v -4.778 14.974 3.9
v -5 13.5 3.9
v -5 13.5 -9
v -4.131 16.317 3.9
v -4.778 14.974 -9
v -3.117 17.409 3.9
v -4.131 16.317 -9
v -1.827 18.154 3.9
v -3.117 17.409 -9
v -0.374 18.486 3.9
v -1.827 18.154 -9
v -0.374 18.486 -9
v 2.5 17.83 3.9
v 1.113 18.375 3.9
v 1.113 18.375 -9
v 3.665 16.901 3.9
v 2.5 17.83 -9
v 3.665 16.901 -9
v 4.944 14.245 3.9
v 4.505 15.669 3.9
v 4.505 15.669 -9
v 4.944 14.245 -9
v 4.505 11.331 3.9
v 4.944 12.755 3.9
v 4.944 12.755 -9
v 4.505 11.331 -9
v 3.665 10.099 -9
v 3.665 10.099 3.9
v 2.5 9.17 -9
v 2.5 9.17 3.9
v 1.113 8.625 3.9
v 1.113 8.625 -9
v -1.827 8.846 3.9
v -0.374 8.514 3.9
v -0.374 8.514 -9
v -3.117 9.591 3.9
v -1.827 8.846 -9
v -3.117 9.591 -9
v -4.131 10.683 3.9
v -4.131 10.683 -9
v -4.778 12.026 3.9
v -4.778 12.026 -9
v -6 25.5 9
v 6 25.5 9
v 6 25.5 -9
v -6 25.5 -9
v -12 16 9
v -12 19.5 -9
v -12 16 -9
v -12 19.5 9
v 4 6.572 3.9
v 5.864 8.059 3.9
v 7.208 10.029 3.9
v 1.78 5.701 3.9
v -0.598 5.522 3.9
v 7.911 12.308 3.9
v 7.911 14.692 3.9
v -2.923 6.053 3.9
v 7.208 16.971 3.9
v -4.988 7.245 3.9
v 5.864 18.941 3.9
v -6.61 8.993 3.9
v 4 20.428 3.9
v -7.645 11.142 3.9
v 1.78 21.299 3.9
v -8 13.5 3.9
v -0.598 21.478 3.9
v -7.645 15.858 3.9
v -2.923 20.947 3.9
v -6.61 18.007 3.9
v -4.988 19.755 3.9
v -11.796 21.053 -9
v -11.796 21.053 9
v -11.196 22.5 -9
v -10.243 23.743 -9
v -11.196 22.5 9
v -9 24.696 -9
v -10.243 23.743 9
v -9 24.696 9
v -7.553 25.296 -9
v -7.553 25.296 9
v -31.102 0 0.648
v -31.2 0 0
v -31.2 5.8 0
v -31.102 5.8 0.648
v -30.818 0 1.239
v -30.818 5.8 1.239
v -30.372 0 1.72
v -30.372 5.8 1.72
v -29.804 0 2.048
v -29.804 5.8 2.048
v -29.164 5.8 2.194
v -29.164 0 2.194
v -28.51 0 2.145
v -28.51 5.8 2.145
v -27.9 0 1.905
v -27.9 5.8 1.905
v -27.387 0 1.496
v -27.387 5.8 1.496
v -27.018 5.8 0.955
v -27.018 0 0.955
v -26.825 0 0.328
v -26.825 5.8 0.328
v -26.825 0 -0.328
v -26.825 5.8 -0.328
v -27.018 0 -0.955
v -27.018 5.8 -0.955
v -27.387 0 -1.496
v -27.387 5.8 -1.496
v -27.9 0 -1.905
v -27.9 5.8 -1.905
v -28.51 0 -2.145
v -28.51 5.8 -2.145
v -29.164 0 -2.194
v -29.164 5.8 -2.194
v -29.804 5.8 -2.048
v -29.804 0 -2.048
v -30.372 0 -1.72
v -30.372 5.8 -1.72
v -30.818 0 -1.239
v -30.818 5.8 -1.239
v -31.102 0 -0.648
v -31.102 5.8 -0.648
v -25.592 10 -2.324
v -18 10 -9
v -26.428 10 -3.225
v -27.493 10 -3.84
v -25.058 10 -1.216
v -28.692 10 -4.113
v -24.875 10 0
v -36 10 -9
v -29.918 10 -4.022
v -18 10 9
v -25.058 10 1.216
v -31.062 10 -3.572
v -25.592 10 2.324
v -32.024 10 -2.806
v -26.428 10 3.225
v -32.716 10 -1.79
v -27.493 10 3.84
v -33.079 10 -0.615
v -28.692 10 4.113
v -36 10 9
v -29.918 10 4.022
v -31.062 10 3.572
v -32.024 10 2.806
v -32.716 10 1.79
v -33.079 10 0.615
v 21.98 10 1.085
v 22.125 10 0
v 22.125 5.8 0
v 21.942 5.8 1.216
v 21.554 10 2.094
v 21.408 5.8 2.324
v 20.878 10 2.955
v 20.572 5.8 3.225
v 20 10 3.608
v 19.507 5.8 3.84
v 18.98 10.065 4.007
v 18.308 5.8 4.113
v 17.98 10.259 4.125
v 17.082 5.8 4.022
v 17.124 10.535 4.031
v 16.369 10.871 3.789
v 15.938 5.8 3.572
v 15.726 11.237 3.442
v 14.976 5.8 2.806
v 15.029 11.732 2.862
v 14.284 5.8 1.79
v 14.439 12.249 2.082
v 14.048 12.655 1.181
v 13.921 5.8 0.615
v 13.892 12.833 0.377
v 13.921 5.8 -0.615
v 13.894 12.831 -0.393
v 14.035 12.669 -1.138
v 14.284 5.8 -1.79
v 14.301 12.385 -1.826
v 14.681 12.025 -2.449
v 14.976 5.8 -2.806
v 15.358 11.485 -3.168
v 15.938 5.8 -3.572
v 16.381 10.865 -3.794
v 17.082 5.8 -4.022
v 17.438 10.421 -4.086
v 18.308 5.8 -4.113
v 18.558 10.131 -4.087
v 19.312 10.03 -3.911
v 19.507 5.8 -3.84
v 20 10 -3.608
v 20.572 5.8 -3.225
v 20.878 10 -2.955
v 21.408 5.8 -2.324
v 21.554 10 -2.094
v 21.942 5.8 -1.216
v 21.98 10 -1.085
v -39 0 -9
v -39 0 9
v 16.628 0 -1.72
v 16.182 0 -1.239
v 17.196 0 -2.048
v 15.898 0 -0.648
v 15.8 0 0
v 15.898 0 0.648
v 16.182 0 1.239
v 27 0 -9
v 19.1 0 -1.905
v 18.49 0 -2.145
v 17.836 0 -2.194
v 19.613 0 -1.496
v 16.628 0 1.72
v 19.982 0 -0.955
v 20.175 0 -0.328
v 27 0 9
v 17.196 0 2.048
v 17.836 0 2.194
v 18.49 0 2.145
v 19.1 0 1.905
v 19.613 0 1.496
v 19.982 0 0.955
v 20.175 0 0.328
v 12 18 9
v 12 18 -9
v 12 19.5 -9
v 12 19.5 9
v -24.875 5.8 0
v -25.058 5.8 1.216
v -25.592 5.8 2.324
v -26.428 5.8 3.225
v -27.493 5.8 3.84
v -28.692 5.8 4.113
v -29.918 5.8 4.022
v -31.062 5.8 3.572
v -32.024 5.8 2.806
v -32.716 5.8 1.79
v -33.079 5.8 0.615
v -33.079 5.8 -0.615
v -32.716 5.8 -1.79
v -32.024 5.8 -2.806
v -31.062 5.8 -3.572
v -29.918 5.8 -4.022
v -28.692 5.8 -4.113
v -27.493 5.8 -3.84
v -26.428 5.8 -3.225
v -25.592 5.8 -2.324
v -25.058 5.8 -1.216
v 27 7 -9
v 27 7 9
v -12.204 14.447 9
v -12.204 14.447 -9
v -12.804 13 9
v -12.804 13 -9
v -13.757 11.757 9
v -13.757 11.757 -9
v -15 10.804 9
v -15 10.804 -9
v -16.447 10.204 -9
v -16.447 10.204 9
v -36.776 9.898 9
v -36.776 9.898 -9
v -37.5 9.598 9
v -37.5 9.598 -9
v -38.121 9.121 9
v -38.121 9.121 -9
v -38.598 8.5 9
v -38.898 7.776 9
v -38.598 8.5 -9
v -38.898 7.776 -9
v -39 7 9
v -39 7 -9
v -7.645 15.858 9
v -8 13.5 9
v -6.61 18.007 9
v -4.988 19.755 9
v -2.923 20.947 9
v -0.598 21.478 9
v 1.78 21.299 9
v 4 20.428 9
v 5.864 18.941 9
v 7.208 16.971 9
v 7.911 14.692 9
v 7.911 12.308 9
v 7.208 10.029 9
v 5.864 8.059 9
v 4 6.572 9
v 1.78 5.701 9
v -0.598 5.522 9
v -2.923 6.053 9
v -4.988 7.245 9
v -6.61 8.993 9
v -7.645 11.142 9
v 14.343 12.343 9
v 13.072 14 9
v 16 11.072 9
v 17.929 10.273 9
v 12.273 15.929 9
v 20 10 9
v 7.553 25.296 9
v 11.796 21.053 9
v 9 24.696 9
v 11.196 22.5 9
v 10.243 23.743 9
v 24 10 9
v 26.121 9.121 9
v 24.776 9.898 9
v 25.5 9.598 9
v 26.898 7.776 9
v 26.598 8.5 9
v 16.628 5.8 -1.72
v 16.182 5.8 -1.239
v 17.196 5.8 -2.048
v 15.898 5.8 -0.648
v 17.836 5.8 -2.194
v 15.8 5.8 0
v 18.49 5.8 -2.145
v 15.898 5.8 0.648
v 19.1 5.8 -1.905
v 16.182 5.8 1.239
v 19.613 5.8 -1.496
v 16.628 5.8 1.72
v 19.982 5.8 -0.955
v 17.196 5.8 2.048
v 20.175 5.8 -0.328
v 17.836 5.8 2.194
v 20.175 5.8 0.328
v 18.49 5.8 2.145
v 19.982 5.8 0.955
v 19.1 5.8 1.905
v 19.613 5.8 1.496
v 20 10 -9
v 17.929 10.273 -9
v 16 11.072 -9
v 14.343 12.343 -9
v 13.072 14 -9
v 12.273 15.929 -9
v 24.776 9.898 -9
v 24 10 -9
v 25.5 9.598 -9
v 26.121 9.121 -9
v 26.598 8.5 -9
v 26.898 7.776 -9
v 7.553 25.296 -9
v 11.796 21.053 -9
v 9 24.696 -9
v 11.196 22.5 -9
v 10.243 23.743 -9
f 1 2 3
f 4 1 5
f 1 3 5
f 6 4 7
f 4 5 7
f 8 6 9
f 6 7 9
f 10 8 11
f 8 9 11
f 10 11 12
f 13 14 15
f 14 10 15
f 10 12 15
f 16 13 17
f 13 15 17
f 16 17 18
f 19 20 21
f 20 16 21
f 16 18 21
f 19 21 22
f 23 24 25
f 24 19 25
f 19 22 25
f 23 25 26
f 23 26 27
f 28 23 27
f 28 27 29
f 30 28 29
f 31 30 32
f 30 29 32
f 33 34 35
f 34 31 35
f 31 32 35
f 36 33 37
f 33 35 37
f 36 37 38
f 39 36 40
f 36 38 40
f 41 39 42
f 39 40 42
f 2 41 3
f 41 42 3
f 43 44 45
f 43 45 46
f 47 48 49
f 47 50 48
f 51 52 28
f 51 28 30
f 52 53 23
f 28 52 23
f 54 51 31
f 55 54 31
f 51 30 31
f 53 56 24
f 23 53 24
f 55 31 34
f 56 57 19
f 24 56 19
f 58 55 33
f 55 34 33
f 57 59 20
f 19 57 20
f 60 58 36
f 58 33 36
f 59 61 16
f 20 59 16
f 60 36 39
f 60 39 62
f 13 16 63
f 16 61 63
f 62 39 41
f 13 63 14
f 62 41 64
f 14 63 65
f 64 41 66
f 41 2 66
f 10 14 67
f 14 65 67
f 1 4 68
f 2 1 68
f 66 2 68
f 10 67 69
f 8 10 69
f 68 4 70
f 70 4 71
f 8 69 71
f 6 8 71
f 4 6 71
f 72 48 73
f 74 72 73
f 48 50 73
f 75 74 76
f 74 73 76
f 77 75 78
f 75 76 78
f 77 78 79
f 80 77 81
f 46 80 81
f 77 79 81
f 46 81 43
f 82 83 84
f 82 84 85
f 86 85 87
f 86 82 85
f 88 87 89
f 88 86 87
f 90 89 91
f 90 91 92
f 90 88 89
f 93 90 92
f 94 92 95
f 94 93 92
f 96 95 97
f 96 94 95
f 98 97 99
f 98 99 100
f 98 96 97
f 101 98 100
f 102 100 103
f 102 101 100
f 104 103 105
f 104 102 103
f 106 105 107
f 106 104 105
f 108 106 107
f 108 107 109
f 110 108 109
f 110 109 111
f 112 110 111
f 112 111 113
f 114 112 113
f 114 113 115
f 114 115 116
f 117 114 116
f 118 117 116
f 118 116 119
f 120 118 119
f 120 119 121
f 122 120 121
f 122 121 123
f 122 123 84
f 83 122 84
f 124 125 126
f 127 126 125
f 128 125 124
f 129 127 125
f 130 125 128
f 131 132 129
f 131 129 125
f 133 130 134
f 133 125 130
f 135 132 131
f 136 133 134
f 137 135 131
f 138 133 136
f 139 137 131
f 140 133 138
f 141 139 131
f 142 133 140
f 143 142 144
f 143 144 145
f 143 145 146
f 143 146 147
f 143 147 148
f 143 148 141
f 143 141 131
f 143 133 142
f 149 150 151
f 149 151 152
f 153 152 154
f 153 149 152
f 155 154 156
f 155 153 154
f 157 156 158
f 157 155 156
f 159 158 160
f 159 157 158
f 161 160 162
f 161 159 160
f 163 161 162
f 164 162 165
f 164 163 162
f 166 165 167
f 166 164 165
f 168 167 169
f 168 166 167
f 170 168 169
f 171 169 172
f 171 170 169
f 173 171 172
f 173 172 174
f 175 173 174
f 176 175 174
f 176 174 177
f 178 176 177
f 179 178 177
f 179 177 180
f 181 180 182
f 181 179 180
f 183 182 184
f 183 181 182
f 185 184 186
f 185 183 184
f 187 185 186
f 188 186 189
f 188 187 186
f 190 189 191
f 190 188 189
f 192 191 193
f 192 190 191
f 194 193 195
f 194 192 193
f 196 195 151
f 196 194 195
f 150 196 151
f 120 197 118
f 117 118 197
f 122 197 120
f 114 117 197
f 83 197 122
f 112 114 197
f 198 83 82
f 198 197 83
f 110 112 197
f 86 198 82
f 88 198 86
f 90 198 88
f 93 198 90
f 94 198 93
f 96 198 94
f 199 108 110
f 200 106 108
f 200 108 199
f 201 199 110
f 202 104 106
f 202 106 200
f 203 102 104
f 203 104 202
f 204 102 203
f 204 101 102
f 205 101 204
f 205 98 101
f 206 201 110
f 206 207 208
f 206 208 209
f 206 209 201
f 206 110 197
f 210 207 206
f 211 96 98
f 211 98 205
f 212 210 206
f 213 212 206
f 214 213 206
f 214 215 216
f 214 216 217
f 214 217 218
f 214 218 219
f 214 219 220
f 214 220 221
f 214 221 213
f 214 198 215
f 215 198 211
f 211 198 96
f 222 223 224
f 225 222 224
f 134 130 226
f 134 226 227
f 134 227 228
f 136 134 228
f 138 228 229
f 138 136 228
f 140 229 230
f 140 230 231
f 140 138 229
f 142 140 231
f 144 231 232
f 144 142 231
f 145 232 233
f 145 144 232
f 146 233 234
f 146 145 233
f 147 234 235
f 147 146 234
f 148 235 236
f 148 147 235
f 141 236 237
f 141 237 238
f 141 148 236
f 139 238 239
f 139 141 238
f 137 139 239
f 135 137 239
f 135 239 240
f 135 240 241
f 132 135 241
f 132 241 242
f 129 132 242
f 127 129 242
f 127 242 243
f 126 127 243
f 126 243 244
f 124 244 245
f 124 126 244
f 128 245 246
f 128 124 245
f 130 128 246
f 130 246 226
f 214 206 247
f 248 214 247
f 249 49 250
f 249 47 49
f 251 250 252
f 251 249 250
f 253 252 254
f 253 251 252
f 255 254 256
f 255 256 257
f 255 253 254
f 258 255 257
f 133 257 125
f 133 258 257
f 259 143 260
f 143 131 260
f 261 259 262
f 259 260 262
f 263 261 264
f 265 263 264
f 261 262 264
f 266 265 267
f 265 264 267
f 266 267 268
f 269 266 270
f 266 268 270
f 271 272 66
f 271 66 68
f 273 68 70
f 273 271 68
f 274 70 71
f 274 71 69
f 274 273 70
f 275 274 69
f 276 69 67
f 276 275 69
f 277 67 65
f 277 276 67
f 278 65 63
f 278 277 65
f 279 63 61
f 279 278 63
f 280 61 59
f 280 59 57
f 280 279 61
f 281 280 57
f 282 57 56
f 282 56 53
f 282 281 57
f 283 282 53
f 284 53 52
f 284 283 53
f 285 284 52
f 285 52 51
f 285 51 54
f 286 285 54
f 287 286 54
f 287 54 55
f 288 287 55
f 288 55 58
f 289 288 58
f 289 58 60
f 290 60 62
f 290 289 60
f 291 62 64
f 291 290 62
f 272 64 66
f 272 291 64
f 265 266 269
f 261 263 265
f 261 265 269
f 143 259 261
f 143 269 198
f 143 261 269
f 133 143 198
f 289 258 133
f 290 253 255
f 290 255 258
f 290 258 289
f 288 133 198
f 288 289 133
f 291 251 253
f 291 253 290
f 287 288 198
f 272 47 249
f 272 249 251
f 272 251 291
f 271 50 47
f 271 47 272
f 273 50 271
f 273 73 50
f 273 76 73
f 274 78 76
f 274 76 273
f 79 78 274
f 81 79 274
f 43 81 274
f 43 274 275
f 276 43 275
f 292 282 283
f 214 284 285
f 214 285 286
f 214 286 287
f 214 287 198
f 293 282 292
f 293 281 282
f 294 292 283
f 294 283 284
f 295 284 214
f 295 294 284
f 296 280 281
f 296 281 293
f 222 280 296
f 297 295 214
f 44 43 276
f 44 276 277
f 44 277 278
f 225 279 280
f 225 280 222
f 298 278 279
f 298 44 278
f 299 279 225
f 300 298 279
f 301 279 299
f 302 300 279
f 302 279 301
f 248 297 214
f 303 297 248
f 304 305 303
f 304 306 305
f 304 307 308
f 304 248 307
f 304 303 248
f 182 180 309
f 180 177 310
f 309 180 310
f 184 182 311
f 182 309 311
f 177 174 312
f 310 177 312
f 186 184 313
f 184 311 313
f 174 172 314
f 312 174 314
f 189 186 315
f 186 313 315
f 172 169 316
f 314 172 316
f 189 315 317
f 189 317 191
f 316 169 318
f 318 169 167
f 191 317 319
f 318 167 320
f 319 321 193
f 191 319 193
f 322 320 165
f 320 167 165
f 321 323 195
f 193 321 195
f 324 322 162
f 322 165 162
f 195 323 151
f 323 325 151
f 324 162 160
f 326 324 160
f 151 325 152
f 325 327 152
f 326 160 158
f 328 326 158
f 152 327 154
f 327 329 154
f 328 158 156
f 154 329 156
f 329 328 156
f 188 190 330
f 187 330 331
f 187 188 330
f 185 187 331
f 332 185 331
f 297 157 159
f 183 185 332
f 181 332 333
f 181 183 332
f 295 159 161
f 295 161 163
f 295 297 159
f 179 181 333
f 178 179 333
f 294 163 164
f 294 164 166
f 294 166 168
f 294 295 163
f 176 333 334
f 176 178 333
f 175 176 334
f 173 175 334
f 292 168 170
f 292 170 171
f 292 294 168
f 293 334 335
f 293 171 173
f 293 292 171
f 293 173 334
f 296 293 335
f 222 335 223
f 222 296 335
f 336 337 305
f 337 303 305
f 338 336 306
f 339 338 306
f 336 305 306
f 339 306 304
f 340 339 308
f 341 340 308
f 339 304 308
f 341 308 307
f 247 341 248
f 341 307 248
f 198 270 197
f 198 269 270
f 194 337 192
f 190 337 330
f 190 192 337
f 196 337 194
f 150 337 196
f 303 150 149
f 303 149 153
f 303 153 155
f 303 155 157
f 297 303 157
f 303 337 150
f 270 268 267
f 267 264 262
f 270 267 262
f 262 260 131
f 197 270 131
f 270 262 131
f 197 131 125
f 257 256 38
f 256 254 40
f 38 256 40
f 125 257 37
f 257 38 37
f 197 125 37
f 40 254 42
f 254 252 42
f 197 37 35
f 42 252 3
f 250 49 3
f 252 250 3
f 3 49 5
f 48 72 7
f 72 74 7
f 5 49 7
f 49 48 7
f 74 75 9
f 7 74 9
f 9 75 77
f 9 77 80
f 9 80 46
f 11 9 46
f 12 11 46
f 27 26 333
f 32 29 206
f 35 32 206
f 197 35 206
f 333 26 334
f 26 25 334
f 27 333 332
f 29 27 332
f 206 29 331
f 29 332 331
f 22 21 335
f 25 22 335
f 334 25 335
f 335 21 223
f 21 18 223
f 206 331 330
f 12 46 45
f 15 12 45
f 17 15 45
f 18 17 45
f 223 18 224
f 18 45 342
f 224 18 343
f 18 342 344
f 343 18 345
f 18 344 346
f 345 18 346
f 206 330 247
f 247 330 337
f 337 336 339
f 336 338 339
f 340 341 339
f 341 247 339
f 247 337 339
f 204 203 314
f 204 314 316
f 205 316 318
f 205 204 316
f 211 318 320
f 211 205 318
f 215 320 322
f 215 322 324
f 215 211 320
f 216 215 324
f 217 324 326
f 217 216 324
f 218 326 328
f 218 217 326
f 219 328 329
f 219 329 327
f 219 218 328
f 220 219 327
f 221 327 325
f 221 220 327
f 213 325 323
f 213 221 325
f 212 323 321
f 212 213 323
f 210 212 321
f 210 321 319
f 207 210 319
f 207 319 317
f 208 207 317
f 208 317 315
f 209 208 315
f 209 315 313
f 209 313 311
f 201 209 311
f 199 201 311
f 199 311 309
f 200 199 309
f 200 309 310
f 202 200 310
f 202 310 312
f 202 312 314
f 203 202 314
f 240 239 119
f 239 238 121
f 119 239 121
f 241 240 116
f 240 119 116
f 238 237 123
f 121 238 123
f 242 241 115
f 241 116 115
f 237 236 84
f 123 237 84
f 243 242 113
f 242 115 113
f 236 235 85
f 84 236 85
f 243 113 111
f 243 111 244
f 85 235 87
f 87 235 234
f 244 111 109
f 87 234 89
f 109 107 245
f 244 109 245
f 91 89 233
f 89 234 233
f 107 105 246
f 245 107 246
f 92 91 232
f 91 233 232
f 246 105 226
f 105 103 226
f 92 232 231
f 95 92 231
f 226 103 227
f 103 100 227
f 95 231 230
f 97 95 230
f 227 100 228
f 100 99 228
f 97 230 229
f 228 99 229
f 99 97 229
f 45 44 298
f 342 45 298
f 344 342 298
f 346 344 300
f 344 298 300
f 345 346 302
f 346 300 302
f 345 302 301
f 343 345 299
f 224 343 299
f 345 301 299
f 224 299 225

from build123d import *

# Parameters (mm, degrees)
SKETCH_R        = 5
PAD_DEPTH       = 9
SKETCH005_R     = 2.2
POCKET_DEPTH    = 25.501
SKETCH006_R     = 8
POCKET001_DEPTH = 5.1
SKETCH007_R     = 4.125
POCKET002_DEPTH = 4.2
FILLET_R        = 3


with BuildPart() as filletbody:
    # Sketch → Pad (new body, symmetric)
    with BuildSketch(Plane.XY):
        with BuildLine():
            Line((-6, 25.5), (6, 25.5))
            ThreePointArc((12, 19.5), (10.242641, 23.742641), (6, 25.5))
            Line((12, 19.5), (12, 16))
            ThreePointArc((12, 16), (13.757359, 11.757359), (18, 10))
            Line((18, 10), (39, 10))
            Line((39, 10), (39, 0))
            Line((39, 0), (-27, 0))
            Line((-27, 0), (-27, 10))
            Line((-27, 10), (-20, 10))
            ThreePointArc((-20, 10), (-14.343146, 12.343146), (-12, 18))
            Line((-12, 18), (-12, 19.5))
            ThreePointArc((-6, 25.5), (-10.242641, 23.742641), (-12, 19.5))
        make_face()
        with Locations((0, 13.5)):
            Circle(SKETCH_R, mode=Mode.SUBTRACT)
    extrude(amount=PAD_DEPTH, both=True)

    # Sketch005 (on Face7 of Pad) → Pocket (cut, through all)
    with BuildSketch(Plane.XZ):
        with Locations((29, 0)):
            Circle(SKETCH005_R)
        with Locations((-18, 0)):
            Circle(SKETCH005_R)
    extrude(amount=-POCKET_DEPTH, mode=Mode.SUBTRACT)

    # Sketch006 (on Face5 of Pocket) → Pocket001 (cut)
    with BuildSketch(Plane.XY.offset(9)):
        with Locations((0, 13.5)):
            Circle(SKETCH006_R)
    extrude(amount=-POCKET001_DEPTH, mode=Mode.SUBTRACT)

    # Sketch007 (on Face9 of Pocket001) → Pocket002 (cut, symmetric)
    with BuildSketch(Plane(origin=(0, 10, 0), x_dir=(-1, 0, 0), z_dir=(0, 1, 0))):
        with Locations((18, 0)):
            Circle(SKETCH007_R)
        with Locations((-29, 0)):
            Circle(SKETCH007_R)
    extrude(amount=POCKET002_DEPTH, both=True, mode=Mode.SUBTRACT)

    # Fillet
    fillet_edges = [filletbody.edges().sort_by_distance(p)[0] for p in [
        (39, 10, 0),
        (-27, 10, 0),
    ]]
    fillet(fillet_edges, radius=FILLET_R)


with BuildPart() as part_mirroring:
    # Part__Mirroring: instance of FilletBody
    add(filletbody.part.mirror(Plane(origin=(0, 0, 0), x_dir=(0, -1, 0), z_dir=(1, 0, 0))))


solid = part_mirroring.part
